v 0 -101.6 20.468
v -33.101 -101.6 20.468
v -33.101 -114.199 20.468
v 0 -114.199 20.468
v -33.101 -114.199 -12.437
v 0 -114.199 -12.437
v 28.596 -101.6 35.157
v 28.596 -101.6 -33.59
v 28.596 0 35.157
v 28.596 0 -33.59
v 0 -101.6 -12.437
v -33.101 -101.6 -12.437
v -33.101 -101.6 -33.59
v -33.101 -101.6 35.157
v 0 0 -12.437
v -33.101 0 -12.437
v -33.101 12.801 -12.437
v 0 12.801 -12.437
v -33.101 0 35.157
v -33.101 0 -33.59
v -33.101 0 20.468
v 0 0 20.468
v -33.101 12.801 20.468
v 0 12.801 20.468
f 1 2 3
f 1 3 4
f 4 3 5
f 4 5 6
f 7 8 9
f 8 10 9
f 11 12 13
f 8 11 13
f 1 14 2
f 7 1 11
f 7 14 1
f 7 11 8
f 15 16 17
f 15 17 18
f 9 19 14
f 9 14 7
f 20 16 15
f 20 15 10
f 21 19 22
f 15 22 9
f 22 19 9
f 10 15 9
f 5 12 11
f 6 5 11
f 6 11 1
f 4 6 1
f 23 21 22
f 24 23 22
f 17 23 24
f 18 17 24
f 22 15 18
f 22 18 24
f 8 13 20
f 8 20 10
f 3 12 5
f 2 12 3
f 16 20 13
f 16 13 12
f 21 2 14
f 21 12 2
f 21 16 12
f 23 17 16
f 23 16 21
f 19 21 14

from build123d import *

# Parameters (mm, degrees)
F0_W     = 61.6968180984
F0_H     = 68.7478855252
F1_DEPTH = 50.8
F2_DEPTH = 25.4
F3_DEPTH = 25.4
F5_W     = 33.1008322537
F5_H     = 32.9049695283
F6_DEPTH = 114.40052
F7_DEPTH = 76.93265
F8_DEPTH = 127
F9_DEPTH = 80.68794


with BuildPart() as f1:
    # F0 (on Front) → F1 (new body)
    with BuildSketch(Plane.XZ):
        with Locations((-2.2524232045, 0.7834509015)):
            Rectangle(F0_W, F0_H)
    extrude(amount=F1_DEPTH)

    # F2 (add): faces of the model
    f2_faces = [f1.faces().sort_by_distance(p)[0] for p in [
        (-2.2524232045, -50.8, 0.7834509015),
        (-2.2524232045, 0, 0.7834509015),
    ]]
    extrude(f2_faces, amount=F2_DEPTH, dir=(0, -1, 0))

    # F3 (add): a face of the model
    f3_faces = [f1.faces().sort_by_distance(p)[0] for p in [
        (-2.2524232045, -76.2, 0.7834509015),
    ]]
    extrude(f3_faces, amount=F3_DEPTH)

    # F5 (on face) → F6 (join)
    with BuildSketch(Plane.XZ.offset(101.6)):
        with Locations((-16.5504161268, 4.0151895955)):
            Rectangle(F5_W, F5_H)
    extrude(amount=-F6_DEPTH)

    # F7 (add): a face of the model
    f7_faces = [f1.faces().sort_by_distance(p)[0] for p in [
        (-16.5504161268, 12.80052, 4.0151895955),
    ]]
    extrude(f7_faces, amount=-F7_DEPTH)

    # F8 (add): a face of the model
    f8_faces = [f1.faces().sort_by_distance(p)[0] for p in [
        (-16.5504161268, 12.80052, 4.0151895955),
    ]]
    extrude(f8_faces, amount=-F8_DEPTH)

    # F9 (add): a face of the model
    f9_faces = [f1.faces().sort_by_distance(p)[0] for p in [
        (-16.5504161268, -114.19948, 4.0151895955),
    ]]
    extrude(f9_faces, amount=-F9_DEPTH)


solid = f1.part
